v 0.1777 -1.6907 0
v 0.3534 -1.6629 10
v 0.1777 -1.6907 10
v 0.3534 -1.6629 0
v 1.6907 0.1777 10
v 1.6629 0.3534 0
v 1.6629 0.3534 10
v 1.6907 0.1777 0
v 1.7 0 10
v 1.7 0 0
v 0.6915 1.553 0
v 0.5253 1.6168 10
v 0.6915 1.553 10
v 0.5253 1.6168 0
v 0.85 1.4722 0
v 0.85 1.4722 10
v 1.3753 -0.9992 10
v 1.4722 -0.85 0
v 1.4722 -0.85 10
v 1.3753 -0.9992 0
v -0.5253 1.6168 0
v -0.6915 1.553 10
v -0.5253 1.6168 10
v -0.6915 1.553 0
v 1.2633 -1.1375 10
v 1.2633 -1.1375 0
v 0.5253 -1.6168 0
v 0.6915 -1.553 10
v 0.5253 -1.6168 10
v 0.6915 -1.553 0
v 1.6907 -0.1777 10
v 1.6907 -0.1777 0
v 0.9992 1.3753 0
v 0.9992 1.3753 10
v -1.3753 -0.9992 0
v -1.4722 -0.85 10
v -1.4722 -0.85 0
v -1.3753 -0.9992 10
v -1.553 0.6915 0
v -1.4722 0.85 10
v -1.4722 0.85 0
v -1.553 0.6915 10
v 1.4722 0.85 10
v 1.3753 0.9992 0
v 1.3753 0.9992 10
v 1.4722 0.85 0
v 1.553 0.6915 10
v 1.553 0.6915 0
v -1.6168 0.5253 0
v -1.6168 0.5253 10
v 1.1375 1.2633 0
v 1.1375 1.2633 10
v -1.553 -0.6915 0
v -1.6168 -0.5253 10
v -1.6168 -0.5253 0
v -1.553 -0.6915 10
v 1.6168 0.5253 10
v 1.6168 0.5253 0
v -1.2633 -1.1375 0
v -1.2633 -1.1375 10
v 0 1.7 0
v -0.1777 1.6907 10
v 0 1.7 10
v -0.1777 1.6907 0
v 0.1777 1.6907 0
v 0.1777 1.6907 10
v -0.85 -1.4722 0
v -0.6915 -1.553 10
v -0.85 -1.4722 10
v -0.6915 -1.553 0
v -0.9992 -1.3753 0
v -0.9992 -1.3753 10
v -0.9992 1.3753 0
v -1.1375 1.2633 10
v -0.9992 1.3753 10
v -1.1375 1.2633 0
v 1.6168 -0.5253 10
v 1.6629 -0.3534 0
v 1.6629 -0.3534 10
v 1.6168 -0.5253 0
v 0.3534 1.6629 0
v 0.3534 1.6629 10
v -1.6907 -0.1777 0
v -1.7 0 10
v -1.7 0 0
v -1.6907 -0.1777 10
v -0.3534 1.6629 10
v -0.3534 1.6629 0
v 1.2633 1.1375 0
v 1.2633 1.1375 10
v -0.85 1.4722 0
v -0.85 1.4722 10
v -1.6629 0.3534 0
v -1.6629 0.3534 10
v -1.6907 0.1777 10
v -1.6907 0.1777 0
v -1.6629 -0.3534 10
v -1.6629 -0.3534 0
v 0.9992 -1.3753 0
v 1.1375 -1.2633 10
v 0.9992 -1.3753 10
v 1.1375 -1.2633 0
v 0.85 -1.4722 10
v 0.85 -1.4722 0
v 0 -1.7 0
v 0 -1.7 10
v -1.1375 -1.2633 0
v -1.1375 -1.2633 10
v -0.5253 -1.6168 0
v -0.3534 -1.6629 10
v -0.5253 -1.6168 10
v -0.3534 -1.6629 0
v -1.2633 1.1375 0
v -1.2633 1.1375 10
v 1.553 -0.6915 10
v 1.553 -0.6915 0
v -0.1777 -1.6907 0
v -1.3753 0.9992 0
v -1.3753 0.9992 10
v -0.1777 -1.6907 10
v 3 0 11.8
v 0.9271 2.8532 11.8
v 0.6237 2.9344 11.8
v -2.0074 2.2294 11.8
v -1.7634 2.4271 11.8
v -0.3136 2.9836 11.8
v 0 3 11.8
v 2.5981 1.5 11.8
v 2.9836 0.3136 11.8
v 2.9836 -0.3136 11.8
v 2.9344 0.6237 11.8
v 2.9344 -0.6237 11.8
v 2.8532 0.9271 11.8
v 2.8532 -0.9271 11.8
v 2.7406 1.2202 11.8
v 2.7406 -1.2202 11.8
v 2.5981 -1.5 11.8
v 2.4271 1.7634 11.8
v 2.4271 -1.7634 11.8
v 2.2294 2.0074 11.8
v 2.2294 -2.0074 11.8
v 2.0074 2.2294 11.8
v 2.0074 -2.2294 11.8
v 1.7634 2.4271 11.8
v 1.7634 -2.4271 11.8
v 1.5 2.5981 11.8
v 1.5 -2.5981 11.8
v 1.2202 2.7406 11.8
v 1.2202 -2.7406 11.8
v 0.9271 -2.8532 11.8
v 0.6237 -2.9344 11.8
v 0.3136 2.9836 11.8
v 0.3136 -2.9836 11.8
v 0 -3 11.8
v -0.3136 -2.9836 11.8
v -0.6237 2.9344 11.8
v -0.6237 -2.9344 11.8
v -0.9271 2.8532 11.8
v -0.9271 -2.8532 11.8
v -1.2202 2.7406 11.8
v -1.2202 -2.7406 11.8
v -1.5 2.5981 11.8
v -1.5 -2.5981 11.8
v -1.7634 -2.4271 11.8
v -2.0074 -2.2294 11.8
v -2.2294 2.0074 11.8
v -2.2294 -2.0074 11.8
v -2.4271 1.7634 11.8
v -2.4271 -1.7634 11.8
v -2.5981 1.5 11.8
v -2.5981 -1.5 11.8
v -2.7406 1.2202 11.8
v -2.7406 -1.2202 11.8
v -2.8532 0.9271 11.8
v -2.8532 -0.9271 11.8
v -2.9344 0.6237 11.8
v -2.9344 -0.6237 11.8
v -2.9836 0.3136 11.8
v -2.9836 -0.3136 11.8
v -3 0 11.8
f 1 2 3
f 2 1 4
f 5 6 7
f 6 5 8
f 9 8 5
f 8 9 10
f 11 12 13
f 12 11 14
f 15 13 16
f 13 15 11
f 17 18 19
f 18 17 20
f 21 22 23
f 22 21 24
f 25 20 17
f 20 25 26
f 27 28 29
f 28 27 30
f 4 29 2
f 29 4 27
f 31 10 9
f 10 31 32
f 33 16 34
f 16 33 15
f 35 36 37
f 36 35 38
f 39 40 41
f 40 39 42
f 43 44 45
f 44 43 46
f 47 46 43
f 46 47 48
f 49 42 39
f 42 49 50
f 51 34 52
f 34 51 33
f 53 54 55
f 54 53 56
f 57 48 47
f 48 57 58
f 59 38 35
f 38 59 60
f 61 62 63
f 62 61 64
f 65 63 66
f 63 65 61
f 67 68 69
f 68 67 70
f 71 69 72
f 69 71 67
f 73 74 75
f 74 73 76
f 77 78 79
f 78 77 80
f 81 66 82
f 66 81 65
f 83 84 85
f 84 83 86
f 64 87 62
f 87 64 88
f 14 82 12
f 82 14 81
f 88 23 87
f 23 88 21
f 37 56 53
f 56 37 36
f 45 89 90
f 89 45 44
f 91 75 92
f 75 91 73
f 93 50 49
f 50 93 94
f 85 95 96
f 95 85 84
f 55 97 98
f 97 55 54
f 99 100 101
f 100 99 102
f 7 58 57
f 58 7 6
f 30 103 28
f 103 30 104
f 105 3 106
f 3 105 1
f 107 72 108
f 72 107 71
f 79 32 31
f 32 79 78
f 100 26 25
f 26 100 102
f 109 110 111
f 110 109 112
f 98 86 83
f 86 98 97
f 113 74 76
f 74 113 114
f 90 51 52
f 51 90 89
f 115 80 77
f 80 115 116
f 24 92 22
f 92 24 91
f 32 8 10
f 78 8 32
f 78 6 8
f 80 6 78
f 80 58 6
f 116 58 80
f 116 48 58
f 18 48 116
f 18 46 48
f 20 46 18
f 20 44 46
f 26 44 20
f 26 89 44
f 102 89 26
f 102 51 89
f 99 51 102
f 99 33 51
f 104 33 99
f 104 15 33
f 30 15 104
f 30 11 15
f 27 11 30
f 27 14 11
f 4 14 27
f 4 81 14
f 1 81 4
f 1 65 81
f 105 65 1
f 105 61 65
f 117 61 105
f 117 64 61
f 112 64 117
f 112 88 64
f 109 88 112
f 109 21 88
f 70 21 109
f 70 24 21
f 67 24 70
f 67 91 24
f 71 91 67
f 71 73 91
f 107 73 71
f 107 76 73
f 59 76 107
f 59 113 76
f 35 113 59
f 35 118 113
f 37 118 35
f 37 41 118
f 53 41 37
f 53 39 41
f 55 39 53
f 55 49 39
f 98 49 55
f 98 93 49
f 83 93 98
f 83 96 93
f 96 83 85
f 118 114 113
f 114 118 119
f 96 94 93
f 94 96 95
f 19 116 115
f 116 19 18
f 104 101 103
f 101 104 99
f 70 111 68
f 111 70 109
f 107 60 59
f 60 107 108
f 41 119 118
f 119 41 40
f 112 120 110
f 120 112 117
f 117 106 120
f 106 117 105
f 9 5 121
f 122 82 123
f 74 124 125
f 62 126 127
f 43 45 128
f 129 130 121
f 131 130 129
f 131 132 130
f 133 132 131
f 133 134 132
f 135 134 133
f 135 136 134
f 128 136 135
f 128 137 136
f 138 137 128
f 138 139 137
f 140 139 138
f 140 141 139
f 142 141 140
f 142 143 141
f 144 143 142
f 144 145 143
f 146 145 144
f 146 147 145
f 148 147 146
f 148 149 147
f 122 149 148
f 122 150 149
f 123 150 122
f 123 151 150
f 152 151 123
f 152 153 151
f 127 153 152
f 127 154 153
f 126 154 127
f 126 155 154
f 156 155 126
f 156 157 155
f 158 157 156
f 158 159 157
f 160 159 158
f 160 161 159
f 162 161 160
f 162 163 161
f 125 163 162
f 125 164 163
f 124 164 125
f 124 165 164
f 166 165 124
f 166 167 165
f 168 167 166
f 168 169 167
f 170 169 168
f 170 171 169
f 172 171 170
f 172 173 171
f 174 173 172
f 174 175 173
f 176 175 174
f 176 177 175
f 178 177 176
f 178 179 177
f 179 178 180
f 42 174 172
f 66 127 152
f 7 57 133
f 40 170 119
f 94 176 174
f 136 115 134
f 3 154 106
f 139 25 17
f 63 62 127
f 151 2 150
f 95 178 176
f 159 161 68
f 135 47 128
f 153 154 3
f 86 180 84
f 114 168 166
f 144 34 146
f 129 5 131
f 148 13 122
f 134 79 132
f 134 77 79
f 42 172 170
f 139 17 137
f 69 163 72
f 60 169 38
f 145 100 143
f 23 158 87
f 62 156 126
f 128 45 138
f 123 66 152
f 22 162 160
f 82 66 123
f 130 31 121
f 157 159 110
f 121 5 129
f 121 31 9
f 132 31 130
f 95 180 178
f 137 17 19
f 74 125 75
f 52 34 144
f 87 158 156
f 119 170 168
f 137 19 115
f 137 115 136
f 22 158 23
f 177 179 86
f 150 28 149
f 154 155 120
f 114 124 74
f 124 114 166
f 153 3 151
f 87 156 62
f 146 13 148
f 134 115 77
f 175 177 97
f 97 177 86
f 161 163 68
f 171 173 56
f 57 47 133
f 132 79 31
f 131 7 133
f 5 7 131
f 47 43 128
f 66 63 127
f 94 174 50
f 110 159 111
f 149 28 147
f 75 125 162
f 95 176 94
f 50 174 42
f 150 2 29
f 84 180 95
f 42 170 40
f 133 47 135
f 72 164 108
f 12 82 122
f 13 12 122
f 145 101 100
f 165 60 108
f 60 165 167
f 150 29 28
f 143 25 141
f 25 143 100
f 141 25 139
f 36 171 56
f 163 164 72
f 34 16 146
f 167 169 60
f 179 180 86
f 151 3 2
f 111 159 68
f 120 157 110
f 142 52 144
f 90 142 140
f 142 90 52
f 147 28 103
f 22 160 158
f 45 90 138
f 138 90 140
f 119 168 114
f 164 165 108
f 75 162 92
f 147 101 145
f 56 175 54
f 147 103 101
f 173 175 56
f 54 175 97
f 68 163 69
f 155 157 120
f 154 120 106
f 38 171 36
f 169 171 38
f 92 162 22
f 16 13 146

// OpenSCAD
// Countersunk screw with 90-degree conical head.
$fn = 60;
eps = 0.02;
shaft_d = 3.4;
head_d = 6;
head_h = 1.8;
shaft_l = 10;
union() {
    cylinder(d = shaft_d, h = shaft_l);
    translate([0, 0, shaft_l]) cylinder(d1 = shaft_d, d2 = head_d, h = head_h);
}
